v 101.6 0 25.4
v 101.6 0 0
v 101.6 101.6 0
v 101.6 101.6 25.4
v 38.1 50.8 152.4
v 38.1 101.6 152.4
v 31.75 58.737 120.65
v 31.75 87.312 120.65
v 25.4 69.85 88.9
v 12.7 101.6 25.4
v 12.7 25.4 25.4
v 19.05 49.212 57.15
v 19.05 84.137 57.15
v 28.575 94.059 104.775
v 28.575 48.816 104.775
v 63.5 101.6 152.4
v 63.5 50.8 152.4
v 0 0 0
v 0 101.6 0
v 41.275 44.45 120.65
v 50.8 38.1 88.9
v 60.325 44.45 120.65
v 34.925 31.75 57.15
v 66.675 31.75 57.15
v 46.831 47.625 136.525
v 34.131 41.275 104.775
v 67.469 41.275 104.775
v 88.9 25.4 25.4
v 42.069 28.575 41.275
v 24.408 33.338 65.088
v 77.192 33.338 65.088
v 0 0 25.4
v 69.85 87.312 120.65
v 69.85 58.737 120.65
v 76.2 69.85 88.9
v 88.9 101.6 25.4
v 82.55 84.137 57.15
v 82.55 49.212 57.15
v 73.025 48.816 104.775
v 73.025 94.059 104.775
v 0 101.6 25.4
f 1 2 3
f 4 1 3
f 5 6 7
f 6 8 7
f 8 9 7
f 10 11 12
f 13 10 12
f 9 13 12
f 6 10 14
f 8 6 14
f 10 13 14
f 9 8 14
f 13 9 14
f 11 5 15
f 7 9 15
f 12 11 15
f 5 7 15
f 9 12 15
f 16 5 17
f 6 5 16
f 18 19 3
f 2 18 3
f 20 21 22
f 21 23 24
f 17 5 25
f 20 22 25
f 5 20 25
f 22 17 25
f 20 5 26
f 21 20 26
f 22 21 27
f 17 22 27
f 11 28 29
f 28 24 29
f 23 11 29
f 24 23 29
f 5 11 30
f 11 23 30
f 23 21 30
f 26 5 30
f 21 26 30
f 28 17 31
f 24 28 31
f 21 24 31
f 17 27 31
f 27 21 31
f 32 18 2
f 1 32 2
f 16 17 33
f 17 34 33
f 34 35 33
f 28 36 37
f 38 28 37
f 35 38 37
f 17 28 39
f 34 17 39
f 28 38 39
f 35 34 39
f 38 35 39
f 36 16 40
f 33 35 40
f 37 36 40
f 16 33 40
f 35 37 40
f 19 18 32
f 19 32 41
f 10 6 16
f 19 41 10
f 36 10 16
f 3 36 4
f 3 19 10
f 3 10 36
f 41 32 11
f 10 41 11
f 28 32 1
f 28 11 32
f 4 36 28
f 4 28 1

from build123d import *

# Parameters (mm, degrees)
F0_W     = 101.6
F0_H     = 101.6
F1_DEPTH = 25.4
F4_W     = 25.4
F4_H     = 50.8
F2_W     = 76.2
F2_H     = 76.2


with BuildPart() as f1:
    # F0 (on Top) → F1 (new body)
    with BuildSketch(Plane.XY):
        with Locations((50.8, 50.8)):
            Rectangle(F0_W, F0_H)
    extrude(amount=F1_DEPTH)

    # F4 (on offset) → F5 section 0
    with BuildSketch(Plane.XY.offset(152.4)):
        with Locations((50.8, 76.2)):
            Rectangle(F4_W, F4_H)
    # F2 (on face) → F5 section 1
    with BuildSketch(Plane.XY.offset(25.4)):
        with Locations((50.8, 63.5)):
            Rectangle(F2_W, F2_H)
    loft()


solid = f1.part
